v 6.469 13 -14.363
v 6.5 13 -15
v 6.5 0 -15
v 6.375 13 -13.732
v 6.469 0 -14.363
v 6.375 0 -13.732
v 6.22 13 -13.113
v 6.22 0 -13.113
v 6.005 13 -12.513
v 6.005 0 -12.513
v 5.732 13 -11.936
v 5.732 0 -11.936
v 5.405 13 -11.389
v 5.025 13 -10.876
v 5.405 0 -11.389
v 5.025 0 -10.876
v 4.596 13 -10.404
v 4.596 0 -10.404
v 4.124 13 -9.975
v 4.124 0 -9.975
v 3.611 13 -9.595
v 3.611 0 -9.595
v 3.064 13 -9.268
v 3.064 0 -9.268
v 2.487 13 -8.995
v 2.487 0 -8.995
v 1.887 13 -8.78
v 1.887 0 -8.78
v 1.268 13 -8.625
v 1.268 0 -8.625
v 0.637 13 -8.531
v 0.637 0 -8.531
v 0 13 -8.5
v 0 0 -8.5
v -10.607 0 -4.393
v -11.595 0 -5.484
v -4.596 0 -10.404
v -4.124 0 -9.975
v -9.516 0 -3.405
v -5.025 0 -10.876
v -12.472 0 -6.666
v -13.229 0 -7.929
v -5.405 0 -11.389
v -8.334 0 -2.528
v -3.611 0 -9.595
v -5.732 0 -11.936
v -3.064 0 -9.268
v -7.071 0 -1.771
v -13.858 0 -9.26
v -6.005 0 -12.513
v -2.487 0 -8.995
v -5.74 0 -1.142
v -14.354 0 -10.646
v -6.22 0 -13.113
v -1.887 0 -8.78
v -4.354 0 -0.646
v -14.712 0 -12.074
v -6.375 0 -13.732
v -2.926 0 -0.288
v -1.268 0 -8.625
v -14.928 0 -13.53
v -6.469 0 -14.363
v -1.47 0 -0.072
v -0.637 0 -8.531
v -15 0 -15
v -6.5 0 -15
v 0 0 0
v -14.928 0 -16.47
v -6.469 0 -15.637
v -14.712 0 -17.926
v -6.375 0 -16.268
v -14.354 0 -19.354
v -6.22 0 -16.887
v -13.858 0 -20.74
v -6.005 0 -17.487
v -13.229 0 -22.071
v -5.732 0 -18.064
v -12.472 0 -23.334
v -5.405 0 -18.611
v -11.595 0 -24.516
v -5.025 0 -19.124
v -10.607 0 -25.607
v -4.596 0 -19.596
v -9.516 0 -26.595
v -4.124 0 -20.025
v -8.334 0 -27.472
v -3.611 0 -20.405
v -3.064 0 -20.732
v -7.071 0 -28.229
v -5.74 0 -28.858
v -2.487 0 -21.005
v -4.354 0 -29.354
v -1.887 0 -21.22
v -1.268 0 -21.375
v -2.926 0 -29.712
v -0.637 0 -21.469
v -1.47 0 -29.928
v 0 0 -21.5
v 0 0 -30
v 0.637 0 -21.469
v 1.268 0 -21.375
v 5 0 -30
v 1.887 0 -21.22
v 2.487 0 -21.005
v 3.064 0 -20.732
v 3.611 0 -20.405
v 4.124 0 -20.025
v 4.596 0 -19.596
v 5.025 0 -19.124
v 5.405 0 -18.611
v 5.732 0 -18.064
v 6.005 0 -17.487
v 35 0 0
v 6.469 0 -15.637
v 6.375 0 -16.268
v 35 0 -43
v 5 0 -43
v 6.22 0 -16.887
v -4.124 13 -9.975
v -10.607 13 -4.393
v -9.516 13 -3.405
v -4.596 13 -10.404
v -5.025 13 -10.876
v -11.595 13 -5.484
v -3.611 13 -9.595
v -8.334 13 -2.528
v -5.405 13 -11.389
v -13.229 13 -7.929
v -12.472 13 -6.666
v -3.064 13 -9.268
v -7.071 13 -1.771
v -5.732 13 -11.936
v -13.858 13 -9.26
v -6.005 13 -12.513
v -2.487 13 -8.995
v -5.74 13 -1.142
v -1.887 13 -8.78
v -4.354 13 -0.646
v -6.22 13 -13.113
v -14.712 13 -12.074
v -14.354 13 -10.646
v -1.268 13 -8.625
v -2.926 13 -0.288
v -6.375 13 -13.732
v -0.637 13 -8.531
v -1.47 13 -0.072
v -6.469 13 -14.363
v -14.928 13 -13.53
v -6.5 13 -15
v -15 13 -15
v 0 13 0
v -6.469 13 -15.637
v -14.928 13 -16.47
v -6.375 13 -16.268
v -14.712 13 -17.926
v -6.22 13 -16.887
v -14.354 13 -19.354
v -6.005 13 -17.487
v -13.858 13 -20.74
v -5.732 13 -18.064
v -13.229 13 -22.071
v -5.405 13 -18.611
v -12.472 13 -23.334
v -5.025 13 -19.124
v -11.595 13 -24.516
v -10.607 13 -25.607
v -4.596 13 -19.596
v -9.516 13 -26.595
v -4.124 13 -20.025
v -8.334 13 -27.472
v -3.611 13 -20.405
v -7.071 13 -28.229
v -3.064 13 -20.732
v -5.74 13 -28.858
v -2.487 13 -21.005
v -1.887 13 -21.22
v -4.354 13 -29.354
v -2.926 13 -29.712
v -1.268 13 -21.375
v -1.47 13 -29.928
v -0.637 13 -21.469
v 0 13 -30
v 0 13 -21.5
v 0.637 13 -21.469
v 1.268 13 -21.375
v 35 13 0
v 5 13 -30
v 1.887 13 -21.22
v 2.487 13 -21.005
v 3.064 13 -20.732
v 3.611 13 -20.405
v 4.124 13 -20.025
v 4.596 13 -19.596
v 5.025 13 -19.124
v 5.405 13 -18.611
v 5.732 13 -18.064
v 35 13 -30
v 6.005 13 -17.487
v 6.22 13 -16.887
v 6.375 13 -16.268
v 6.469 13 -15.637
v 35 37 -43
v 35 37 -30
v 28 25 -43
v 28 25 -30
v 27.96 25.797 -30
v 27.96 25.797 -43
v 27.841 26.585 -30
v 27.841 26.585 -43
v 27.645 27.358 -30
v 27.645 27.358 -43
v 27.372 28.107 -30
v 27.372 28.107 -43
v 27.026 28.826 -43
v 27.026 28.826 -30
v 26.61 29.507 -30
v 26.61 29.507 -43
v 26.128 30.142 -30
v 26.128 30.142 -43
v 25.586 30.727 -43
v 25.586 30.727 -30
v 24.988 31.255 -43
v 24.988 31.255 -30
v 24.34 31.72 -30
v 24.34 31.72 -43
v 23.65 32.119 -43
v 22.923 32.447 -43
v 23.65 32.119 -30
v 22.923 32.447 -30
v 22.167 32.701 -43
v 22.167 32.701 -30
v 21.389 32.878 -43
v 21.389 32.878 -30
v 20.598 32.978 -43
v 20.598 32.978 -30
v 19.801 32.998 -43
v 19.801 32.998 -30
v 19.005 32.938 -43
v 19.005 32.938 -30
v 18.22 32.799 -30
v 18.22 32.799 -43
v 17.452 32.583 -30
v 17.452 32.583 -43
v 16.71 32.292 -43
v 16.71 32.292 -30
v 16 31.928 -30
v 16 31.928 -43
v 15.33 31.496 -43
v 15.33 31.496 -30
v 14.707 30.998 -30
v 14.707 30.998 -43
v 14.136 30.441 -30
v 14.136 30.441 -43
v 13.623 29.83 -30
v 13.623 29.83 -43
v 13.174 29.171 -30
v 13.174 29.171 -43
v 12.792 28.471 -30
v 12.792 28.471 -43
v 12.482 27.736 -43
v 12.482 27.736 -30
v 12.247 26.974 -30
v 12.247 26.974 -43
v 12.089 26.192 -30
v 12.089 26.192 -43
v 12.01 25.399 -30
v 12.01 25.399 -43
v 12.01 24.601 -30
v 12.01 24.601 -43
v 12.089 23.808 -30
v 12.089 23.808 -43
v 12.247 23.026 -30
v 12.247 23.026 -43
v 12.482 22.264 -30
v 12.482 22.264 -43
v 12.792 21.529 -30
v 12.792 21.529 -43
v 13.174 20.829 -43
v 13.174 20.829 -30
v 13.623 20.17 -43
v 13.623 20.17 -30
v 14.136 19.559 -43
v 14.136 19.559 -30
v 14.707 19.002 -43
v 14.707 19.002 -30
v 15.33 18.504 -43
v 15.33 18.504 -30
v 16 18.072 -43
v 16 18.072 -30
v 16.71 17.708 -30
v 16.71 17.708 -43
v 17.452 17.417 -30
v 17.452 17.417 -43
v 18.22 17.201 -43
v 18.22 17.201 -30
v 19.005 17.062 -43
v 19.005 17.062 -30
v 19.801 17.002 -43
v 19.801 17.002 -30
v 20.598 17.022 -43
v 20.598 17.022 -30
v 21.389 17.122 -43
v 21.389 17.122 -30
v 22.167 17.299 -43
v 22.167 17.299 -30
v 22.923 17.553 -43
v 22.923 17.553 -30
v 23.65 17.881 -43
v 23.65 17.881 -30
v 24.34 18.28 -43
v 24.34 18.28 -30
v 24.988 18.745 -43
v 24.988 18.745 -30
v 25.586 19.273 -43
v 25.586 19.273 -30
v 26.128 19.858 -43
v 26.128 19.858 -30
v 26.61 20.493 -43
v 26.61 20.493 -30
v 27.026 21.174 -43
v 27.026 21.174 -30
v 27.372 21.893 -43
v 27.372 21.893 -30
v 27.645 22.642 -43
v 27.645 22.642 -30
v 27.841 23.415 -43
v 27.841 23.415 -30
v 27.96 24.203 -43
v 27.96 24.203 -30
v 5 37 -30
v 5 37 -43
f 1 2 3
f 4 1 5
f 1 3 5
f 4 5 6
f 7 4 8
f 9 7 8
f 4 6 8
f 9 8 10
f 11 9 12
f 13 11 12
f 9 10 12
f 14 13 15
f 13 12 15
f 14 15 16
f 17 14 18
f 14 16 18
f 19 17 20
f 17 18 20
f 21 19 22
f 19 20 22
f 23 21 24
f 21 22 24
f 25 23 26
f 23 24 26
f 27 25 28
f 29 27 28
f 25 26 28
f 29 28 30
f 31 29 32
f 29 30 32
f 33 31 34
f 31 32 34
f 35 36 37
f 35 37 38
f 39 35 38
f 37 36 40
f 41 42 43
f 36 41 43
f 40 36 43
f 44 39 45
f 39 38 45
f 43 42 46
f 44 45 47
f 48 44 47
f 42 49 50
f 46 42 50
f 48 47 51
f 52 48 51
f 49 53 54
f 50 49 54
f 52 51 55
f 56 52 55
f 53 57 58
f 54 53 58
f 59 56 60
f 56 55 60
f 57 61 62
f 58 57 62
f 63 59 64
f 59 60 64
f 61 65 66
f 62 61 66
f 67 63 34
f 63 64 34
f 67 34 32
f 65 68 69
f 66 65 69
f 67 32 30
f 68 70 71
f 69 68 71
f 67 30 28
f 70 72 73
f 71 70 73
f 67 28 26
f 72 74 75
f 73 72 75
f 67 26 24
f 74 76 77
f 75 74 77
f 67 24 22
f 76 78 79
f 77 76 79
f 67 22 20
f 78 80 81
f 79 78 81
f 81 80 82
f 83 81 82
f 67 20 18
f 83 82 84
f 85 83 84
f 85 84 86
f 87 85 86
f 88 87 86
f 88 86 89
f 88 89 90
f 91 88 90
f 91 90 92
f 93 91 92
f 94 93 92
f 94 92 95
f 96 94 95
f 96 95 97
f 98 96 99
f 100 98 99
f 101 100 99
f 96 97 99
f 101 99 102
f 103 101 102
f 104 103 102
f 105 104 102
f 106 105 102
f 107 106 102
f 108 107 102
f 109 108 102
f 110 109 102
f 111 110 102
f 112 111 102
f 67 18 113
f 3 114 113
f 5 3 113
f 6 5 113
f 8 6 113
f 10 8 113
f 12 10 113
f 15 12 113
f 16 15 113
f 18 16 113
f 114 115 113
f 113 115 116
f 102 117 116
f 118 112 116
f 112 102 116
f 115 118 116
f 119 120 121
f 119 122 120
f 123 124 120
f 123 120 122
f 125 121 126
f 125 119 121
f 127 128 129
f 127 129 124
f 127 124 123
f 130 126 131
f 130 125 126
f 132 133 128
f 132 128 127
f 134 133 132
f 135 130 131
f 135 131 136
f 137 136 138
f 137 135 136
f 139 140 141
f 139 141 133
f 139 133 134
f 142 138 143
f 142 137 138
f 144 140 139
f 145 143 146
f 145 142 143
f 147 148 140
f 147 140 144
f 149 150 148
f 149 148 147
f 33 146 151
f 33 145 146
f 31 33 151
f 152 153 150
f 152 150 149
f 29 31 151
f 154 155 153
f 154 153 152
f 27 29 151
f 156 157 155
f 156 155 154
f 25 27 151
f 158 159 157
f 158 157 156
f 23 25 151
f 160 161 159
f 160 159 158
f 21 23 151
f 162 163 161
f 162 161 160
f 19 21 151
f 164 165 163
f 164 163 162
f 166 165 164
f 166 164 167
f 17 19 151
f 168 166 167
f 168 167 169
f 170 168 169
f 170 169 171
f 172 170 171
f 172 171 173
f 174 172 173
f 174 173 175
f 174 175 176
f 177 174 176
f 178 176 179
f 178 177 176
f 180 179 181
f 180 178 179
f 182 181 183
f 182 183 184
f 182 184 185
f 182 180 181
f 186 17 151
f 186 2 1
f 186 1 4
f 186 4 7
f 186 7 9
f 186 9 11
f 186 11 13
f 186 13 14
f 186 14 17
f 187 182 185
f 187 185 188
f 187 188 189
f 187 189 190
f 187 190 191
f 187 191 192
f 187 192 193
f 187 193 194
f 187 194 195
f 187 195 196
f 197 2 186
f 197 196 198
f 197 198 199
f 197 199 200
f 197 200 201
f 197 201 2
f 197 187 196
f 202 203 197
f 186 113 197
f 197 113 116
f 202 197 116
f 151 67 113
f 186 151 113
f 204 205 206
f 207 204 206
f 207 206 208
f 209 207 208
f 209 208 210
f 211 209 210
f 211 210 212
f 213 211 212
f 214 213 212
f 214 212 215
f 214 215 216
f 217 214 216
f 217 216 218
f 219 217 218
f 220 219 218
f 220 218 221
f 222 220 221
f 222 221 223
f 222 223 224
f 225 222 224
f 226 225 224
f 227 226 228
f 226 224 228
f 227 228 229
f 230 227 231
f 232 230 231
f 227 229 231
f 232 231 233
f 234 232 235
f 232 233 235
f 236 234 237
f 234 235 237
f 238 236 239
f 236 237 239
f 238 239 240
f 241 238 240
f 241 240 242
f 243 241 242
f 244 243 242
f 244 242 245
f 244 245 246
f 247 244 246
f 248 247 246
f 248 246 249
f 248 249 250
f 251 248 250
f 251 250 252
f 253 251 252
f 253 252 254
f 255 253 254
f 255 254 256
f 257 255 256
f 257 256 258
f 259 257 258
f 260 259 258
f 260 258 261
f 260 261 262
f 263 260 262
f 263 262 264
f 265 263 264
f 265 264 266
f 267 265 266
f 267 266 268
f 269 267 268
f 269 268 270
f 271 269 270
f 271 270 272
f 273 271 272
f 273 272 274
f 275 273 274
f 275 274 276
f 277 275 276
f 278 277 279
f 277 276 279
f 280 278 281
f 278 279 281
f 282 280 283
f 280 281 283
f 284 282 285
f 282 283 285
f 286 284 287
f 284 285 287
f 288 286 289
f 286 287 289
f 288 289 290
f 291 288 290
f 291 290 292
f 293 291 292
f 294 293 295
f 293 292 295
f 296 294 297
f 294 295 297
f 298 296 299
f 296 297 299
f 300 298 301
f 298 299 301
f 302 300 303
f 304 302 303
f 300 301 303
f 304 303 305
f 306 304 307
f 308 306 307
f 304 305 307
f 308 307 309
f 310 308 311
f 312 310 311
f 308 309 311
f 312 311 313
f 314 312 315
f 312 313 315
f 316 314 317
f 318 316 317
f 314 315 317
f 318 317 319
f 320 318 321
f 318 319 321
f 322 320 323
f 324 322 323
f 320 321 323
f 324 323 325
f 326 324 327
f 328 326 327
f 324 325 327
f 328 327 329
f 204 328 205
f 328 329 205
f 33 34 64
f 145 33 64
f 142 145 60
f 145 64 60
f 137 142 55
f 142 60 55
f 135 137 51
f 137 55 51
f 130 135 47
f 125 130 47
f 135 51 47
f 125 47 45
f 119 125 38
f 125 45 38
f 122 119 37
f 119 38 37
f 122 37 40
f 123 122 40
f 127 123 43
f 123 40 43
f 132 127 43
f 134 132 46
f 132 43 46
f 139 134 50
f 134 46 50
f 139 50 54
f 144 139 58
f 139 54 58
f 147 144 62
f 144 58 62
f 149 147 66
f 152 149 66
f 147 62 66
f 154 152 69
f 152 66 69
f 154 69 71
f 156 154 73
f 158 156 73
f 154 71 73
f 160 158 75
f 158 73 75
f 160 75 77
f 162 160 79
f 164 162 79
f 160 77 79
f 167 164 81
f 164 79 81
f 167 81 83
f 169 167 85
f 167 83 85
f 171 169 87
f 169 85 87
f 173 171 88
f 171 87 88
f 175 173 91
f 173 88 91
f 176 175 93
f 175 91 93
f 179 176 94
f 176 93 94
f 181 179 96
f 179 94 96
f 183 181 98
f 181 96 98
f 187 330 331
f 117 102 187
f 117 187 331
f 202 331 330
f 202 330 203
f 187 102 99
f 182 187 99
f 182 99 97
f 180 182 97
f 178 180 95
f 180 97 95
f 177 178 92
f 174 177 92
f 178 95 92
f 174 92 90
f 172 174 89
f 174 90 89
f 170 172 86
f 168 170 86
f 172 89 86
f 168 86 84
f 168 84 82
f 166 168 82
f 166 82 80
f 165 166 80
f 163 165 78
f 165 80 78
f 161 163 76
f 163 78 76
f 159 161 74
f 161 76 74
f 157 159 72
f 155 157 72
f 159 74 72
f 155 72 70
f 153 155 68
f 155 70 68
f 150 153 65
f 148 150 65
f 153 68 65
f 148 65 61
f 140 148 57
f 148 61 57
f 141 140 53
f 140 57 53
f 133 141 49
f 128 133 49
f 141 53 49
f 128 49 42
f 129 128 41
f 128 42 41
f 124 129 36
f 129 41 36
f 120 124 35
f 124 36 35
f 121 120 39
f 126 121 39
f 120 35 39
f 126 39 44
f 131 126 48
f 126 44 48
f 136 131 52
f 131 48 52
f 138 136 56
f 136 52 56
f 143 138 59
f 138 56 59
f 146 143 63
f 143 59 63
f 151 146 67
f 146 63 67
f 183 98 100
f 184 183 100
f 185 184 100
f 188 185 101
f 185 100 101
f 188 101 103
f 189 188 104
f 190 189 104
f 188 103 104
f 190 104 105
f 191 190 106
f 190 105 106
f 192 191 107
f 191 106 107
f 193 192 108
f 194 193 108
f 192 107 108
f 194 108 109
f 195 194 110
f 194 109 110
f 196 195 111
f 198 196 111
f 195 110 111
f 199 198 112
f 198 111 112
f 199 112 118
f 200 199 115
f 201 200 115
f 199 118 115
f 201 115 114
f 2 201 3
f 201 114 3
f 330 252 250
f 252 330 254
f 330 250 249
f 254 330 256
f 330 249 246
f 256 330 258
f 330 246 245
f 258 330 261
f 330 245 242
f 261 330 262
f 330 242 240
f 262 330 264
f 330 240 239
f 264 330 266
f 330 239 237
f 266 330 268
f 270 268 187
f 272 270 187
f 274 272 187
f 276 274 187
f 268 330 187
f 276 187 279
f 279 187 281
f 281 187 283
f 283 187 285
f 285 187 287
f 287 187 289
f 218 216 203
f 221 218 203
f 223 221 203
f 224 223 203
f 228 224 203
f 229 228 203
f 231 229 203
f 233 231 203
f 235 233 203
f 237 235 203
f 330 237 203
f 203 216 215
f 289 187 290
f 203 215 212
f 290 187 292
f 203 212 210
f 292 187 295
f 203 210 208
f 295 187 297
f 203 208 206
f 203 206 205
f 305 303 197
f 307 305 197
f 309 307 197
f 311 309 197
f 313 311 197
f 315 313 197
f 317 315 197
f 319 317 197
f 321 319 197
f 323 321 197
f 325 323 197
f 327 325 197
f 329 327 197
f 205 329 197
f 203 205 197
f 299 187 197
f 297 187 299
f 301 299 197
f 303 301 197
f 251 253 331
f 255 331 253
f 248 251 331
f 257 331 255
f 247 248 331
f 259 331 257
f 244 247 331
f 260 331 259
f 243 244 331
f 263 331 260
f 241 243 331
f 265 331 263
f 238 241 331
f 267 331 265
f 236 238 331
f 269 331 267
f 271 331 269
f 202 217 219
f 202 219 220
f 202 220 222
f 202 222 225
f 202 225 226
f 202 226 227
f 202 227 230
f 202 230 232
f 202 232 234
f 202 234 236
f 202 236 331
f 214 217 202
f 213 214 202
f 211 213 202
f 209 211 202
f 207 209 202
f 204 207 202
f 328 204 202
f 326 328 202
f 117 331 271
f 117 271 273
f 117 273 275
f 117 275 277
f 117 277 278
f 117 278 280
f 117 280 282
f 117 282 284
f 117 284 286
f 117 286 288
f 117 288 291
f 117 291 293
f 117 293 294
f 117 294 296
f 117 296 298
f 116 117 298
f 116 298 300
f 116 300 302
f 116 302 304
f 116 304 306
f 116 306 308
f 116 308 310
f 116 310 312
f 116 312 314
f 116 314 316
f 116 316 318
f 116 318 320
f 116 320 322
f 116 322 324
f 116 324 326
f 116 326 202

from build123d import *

# Parameters (mm, degrees)
SKETCH1_R           = 6.5
BOSS_EXTRUDE1_DEPTH = 13
SKETCH1_3_W         = 30
SKETCH1_3_H         = 13
BOSS_EXTRUDE2_DEPTH = 37
SKETCH2_R           = 8
CUT_EXTRUDE1_DEPTH  = 37


with BuildPart() as part:
    # Sketch1 → Boss-Extrude1 (new body)
    with BuildSketch(Plane(origin=(0, 0, 0), x_dir=(1, 0, 0), z_dir=(0, 1, 0))):
        with BuildLine():
            ThreePointArc((0, 30), (-15, 15), (0, 0))
            Line((0, 0), (35, 0))
            Line((35, 0), (35, 30))
            Line((35, 30), (0, 30))
        make_face()
        with Locations((0, 15)):
            Circle(SKETCH1_R, mode=Mode.SUBTRACT)
    extrude(amount=BOSS_EXTRUDE1_DEPTH)

    # Sketch1<3> → Boss-Extrude2 (add)
    with BuildSketch(Plane(origin=(0, 0, 0), x_dir=(1, 0, 0), z_dir=(0, 1, 0))):
        with Locations((20, 36.5)):
            Rectangle(SKETCH1_3_W, SKETCH1_3_H)
    extrude(amount=BOSS_EXTRUDE2_DEPTH)

    # Sketch2 → Cut-Extrude1 (cut)
    with BuildSketch(Plane.XY.offset(-30)):
        with Locations((20, 25)):
            Circle(SKETCH2_R)
    extrude(amount=-CUT_EXTRUDE1_DEPTH, mode=Mode.SUBTRACT)


solid = part.part
